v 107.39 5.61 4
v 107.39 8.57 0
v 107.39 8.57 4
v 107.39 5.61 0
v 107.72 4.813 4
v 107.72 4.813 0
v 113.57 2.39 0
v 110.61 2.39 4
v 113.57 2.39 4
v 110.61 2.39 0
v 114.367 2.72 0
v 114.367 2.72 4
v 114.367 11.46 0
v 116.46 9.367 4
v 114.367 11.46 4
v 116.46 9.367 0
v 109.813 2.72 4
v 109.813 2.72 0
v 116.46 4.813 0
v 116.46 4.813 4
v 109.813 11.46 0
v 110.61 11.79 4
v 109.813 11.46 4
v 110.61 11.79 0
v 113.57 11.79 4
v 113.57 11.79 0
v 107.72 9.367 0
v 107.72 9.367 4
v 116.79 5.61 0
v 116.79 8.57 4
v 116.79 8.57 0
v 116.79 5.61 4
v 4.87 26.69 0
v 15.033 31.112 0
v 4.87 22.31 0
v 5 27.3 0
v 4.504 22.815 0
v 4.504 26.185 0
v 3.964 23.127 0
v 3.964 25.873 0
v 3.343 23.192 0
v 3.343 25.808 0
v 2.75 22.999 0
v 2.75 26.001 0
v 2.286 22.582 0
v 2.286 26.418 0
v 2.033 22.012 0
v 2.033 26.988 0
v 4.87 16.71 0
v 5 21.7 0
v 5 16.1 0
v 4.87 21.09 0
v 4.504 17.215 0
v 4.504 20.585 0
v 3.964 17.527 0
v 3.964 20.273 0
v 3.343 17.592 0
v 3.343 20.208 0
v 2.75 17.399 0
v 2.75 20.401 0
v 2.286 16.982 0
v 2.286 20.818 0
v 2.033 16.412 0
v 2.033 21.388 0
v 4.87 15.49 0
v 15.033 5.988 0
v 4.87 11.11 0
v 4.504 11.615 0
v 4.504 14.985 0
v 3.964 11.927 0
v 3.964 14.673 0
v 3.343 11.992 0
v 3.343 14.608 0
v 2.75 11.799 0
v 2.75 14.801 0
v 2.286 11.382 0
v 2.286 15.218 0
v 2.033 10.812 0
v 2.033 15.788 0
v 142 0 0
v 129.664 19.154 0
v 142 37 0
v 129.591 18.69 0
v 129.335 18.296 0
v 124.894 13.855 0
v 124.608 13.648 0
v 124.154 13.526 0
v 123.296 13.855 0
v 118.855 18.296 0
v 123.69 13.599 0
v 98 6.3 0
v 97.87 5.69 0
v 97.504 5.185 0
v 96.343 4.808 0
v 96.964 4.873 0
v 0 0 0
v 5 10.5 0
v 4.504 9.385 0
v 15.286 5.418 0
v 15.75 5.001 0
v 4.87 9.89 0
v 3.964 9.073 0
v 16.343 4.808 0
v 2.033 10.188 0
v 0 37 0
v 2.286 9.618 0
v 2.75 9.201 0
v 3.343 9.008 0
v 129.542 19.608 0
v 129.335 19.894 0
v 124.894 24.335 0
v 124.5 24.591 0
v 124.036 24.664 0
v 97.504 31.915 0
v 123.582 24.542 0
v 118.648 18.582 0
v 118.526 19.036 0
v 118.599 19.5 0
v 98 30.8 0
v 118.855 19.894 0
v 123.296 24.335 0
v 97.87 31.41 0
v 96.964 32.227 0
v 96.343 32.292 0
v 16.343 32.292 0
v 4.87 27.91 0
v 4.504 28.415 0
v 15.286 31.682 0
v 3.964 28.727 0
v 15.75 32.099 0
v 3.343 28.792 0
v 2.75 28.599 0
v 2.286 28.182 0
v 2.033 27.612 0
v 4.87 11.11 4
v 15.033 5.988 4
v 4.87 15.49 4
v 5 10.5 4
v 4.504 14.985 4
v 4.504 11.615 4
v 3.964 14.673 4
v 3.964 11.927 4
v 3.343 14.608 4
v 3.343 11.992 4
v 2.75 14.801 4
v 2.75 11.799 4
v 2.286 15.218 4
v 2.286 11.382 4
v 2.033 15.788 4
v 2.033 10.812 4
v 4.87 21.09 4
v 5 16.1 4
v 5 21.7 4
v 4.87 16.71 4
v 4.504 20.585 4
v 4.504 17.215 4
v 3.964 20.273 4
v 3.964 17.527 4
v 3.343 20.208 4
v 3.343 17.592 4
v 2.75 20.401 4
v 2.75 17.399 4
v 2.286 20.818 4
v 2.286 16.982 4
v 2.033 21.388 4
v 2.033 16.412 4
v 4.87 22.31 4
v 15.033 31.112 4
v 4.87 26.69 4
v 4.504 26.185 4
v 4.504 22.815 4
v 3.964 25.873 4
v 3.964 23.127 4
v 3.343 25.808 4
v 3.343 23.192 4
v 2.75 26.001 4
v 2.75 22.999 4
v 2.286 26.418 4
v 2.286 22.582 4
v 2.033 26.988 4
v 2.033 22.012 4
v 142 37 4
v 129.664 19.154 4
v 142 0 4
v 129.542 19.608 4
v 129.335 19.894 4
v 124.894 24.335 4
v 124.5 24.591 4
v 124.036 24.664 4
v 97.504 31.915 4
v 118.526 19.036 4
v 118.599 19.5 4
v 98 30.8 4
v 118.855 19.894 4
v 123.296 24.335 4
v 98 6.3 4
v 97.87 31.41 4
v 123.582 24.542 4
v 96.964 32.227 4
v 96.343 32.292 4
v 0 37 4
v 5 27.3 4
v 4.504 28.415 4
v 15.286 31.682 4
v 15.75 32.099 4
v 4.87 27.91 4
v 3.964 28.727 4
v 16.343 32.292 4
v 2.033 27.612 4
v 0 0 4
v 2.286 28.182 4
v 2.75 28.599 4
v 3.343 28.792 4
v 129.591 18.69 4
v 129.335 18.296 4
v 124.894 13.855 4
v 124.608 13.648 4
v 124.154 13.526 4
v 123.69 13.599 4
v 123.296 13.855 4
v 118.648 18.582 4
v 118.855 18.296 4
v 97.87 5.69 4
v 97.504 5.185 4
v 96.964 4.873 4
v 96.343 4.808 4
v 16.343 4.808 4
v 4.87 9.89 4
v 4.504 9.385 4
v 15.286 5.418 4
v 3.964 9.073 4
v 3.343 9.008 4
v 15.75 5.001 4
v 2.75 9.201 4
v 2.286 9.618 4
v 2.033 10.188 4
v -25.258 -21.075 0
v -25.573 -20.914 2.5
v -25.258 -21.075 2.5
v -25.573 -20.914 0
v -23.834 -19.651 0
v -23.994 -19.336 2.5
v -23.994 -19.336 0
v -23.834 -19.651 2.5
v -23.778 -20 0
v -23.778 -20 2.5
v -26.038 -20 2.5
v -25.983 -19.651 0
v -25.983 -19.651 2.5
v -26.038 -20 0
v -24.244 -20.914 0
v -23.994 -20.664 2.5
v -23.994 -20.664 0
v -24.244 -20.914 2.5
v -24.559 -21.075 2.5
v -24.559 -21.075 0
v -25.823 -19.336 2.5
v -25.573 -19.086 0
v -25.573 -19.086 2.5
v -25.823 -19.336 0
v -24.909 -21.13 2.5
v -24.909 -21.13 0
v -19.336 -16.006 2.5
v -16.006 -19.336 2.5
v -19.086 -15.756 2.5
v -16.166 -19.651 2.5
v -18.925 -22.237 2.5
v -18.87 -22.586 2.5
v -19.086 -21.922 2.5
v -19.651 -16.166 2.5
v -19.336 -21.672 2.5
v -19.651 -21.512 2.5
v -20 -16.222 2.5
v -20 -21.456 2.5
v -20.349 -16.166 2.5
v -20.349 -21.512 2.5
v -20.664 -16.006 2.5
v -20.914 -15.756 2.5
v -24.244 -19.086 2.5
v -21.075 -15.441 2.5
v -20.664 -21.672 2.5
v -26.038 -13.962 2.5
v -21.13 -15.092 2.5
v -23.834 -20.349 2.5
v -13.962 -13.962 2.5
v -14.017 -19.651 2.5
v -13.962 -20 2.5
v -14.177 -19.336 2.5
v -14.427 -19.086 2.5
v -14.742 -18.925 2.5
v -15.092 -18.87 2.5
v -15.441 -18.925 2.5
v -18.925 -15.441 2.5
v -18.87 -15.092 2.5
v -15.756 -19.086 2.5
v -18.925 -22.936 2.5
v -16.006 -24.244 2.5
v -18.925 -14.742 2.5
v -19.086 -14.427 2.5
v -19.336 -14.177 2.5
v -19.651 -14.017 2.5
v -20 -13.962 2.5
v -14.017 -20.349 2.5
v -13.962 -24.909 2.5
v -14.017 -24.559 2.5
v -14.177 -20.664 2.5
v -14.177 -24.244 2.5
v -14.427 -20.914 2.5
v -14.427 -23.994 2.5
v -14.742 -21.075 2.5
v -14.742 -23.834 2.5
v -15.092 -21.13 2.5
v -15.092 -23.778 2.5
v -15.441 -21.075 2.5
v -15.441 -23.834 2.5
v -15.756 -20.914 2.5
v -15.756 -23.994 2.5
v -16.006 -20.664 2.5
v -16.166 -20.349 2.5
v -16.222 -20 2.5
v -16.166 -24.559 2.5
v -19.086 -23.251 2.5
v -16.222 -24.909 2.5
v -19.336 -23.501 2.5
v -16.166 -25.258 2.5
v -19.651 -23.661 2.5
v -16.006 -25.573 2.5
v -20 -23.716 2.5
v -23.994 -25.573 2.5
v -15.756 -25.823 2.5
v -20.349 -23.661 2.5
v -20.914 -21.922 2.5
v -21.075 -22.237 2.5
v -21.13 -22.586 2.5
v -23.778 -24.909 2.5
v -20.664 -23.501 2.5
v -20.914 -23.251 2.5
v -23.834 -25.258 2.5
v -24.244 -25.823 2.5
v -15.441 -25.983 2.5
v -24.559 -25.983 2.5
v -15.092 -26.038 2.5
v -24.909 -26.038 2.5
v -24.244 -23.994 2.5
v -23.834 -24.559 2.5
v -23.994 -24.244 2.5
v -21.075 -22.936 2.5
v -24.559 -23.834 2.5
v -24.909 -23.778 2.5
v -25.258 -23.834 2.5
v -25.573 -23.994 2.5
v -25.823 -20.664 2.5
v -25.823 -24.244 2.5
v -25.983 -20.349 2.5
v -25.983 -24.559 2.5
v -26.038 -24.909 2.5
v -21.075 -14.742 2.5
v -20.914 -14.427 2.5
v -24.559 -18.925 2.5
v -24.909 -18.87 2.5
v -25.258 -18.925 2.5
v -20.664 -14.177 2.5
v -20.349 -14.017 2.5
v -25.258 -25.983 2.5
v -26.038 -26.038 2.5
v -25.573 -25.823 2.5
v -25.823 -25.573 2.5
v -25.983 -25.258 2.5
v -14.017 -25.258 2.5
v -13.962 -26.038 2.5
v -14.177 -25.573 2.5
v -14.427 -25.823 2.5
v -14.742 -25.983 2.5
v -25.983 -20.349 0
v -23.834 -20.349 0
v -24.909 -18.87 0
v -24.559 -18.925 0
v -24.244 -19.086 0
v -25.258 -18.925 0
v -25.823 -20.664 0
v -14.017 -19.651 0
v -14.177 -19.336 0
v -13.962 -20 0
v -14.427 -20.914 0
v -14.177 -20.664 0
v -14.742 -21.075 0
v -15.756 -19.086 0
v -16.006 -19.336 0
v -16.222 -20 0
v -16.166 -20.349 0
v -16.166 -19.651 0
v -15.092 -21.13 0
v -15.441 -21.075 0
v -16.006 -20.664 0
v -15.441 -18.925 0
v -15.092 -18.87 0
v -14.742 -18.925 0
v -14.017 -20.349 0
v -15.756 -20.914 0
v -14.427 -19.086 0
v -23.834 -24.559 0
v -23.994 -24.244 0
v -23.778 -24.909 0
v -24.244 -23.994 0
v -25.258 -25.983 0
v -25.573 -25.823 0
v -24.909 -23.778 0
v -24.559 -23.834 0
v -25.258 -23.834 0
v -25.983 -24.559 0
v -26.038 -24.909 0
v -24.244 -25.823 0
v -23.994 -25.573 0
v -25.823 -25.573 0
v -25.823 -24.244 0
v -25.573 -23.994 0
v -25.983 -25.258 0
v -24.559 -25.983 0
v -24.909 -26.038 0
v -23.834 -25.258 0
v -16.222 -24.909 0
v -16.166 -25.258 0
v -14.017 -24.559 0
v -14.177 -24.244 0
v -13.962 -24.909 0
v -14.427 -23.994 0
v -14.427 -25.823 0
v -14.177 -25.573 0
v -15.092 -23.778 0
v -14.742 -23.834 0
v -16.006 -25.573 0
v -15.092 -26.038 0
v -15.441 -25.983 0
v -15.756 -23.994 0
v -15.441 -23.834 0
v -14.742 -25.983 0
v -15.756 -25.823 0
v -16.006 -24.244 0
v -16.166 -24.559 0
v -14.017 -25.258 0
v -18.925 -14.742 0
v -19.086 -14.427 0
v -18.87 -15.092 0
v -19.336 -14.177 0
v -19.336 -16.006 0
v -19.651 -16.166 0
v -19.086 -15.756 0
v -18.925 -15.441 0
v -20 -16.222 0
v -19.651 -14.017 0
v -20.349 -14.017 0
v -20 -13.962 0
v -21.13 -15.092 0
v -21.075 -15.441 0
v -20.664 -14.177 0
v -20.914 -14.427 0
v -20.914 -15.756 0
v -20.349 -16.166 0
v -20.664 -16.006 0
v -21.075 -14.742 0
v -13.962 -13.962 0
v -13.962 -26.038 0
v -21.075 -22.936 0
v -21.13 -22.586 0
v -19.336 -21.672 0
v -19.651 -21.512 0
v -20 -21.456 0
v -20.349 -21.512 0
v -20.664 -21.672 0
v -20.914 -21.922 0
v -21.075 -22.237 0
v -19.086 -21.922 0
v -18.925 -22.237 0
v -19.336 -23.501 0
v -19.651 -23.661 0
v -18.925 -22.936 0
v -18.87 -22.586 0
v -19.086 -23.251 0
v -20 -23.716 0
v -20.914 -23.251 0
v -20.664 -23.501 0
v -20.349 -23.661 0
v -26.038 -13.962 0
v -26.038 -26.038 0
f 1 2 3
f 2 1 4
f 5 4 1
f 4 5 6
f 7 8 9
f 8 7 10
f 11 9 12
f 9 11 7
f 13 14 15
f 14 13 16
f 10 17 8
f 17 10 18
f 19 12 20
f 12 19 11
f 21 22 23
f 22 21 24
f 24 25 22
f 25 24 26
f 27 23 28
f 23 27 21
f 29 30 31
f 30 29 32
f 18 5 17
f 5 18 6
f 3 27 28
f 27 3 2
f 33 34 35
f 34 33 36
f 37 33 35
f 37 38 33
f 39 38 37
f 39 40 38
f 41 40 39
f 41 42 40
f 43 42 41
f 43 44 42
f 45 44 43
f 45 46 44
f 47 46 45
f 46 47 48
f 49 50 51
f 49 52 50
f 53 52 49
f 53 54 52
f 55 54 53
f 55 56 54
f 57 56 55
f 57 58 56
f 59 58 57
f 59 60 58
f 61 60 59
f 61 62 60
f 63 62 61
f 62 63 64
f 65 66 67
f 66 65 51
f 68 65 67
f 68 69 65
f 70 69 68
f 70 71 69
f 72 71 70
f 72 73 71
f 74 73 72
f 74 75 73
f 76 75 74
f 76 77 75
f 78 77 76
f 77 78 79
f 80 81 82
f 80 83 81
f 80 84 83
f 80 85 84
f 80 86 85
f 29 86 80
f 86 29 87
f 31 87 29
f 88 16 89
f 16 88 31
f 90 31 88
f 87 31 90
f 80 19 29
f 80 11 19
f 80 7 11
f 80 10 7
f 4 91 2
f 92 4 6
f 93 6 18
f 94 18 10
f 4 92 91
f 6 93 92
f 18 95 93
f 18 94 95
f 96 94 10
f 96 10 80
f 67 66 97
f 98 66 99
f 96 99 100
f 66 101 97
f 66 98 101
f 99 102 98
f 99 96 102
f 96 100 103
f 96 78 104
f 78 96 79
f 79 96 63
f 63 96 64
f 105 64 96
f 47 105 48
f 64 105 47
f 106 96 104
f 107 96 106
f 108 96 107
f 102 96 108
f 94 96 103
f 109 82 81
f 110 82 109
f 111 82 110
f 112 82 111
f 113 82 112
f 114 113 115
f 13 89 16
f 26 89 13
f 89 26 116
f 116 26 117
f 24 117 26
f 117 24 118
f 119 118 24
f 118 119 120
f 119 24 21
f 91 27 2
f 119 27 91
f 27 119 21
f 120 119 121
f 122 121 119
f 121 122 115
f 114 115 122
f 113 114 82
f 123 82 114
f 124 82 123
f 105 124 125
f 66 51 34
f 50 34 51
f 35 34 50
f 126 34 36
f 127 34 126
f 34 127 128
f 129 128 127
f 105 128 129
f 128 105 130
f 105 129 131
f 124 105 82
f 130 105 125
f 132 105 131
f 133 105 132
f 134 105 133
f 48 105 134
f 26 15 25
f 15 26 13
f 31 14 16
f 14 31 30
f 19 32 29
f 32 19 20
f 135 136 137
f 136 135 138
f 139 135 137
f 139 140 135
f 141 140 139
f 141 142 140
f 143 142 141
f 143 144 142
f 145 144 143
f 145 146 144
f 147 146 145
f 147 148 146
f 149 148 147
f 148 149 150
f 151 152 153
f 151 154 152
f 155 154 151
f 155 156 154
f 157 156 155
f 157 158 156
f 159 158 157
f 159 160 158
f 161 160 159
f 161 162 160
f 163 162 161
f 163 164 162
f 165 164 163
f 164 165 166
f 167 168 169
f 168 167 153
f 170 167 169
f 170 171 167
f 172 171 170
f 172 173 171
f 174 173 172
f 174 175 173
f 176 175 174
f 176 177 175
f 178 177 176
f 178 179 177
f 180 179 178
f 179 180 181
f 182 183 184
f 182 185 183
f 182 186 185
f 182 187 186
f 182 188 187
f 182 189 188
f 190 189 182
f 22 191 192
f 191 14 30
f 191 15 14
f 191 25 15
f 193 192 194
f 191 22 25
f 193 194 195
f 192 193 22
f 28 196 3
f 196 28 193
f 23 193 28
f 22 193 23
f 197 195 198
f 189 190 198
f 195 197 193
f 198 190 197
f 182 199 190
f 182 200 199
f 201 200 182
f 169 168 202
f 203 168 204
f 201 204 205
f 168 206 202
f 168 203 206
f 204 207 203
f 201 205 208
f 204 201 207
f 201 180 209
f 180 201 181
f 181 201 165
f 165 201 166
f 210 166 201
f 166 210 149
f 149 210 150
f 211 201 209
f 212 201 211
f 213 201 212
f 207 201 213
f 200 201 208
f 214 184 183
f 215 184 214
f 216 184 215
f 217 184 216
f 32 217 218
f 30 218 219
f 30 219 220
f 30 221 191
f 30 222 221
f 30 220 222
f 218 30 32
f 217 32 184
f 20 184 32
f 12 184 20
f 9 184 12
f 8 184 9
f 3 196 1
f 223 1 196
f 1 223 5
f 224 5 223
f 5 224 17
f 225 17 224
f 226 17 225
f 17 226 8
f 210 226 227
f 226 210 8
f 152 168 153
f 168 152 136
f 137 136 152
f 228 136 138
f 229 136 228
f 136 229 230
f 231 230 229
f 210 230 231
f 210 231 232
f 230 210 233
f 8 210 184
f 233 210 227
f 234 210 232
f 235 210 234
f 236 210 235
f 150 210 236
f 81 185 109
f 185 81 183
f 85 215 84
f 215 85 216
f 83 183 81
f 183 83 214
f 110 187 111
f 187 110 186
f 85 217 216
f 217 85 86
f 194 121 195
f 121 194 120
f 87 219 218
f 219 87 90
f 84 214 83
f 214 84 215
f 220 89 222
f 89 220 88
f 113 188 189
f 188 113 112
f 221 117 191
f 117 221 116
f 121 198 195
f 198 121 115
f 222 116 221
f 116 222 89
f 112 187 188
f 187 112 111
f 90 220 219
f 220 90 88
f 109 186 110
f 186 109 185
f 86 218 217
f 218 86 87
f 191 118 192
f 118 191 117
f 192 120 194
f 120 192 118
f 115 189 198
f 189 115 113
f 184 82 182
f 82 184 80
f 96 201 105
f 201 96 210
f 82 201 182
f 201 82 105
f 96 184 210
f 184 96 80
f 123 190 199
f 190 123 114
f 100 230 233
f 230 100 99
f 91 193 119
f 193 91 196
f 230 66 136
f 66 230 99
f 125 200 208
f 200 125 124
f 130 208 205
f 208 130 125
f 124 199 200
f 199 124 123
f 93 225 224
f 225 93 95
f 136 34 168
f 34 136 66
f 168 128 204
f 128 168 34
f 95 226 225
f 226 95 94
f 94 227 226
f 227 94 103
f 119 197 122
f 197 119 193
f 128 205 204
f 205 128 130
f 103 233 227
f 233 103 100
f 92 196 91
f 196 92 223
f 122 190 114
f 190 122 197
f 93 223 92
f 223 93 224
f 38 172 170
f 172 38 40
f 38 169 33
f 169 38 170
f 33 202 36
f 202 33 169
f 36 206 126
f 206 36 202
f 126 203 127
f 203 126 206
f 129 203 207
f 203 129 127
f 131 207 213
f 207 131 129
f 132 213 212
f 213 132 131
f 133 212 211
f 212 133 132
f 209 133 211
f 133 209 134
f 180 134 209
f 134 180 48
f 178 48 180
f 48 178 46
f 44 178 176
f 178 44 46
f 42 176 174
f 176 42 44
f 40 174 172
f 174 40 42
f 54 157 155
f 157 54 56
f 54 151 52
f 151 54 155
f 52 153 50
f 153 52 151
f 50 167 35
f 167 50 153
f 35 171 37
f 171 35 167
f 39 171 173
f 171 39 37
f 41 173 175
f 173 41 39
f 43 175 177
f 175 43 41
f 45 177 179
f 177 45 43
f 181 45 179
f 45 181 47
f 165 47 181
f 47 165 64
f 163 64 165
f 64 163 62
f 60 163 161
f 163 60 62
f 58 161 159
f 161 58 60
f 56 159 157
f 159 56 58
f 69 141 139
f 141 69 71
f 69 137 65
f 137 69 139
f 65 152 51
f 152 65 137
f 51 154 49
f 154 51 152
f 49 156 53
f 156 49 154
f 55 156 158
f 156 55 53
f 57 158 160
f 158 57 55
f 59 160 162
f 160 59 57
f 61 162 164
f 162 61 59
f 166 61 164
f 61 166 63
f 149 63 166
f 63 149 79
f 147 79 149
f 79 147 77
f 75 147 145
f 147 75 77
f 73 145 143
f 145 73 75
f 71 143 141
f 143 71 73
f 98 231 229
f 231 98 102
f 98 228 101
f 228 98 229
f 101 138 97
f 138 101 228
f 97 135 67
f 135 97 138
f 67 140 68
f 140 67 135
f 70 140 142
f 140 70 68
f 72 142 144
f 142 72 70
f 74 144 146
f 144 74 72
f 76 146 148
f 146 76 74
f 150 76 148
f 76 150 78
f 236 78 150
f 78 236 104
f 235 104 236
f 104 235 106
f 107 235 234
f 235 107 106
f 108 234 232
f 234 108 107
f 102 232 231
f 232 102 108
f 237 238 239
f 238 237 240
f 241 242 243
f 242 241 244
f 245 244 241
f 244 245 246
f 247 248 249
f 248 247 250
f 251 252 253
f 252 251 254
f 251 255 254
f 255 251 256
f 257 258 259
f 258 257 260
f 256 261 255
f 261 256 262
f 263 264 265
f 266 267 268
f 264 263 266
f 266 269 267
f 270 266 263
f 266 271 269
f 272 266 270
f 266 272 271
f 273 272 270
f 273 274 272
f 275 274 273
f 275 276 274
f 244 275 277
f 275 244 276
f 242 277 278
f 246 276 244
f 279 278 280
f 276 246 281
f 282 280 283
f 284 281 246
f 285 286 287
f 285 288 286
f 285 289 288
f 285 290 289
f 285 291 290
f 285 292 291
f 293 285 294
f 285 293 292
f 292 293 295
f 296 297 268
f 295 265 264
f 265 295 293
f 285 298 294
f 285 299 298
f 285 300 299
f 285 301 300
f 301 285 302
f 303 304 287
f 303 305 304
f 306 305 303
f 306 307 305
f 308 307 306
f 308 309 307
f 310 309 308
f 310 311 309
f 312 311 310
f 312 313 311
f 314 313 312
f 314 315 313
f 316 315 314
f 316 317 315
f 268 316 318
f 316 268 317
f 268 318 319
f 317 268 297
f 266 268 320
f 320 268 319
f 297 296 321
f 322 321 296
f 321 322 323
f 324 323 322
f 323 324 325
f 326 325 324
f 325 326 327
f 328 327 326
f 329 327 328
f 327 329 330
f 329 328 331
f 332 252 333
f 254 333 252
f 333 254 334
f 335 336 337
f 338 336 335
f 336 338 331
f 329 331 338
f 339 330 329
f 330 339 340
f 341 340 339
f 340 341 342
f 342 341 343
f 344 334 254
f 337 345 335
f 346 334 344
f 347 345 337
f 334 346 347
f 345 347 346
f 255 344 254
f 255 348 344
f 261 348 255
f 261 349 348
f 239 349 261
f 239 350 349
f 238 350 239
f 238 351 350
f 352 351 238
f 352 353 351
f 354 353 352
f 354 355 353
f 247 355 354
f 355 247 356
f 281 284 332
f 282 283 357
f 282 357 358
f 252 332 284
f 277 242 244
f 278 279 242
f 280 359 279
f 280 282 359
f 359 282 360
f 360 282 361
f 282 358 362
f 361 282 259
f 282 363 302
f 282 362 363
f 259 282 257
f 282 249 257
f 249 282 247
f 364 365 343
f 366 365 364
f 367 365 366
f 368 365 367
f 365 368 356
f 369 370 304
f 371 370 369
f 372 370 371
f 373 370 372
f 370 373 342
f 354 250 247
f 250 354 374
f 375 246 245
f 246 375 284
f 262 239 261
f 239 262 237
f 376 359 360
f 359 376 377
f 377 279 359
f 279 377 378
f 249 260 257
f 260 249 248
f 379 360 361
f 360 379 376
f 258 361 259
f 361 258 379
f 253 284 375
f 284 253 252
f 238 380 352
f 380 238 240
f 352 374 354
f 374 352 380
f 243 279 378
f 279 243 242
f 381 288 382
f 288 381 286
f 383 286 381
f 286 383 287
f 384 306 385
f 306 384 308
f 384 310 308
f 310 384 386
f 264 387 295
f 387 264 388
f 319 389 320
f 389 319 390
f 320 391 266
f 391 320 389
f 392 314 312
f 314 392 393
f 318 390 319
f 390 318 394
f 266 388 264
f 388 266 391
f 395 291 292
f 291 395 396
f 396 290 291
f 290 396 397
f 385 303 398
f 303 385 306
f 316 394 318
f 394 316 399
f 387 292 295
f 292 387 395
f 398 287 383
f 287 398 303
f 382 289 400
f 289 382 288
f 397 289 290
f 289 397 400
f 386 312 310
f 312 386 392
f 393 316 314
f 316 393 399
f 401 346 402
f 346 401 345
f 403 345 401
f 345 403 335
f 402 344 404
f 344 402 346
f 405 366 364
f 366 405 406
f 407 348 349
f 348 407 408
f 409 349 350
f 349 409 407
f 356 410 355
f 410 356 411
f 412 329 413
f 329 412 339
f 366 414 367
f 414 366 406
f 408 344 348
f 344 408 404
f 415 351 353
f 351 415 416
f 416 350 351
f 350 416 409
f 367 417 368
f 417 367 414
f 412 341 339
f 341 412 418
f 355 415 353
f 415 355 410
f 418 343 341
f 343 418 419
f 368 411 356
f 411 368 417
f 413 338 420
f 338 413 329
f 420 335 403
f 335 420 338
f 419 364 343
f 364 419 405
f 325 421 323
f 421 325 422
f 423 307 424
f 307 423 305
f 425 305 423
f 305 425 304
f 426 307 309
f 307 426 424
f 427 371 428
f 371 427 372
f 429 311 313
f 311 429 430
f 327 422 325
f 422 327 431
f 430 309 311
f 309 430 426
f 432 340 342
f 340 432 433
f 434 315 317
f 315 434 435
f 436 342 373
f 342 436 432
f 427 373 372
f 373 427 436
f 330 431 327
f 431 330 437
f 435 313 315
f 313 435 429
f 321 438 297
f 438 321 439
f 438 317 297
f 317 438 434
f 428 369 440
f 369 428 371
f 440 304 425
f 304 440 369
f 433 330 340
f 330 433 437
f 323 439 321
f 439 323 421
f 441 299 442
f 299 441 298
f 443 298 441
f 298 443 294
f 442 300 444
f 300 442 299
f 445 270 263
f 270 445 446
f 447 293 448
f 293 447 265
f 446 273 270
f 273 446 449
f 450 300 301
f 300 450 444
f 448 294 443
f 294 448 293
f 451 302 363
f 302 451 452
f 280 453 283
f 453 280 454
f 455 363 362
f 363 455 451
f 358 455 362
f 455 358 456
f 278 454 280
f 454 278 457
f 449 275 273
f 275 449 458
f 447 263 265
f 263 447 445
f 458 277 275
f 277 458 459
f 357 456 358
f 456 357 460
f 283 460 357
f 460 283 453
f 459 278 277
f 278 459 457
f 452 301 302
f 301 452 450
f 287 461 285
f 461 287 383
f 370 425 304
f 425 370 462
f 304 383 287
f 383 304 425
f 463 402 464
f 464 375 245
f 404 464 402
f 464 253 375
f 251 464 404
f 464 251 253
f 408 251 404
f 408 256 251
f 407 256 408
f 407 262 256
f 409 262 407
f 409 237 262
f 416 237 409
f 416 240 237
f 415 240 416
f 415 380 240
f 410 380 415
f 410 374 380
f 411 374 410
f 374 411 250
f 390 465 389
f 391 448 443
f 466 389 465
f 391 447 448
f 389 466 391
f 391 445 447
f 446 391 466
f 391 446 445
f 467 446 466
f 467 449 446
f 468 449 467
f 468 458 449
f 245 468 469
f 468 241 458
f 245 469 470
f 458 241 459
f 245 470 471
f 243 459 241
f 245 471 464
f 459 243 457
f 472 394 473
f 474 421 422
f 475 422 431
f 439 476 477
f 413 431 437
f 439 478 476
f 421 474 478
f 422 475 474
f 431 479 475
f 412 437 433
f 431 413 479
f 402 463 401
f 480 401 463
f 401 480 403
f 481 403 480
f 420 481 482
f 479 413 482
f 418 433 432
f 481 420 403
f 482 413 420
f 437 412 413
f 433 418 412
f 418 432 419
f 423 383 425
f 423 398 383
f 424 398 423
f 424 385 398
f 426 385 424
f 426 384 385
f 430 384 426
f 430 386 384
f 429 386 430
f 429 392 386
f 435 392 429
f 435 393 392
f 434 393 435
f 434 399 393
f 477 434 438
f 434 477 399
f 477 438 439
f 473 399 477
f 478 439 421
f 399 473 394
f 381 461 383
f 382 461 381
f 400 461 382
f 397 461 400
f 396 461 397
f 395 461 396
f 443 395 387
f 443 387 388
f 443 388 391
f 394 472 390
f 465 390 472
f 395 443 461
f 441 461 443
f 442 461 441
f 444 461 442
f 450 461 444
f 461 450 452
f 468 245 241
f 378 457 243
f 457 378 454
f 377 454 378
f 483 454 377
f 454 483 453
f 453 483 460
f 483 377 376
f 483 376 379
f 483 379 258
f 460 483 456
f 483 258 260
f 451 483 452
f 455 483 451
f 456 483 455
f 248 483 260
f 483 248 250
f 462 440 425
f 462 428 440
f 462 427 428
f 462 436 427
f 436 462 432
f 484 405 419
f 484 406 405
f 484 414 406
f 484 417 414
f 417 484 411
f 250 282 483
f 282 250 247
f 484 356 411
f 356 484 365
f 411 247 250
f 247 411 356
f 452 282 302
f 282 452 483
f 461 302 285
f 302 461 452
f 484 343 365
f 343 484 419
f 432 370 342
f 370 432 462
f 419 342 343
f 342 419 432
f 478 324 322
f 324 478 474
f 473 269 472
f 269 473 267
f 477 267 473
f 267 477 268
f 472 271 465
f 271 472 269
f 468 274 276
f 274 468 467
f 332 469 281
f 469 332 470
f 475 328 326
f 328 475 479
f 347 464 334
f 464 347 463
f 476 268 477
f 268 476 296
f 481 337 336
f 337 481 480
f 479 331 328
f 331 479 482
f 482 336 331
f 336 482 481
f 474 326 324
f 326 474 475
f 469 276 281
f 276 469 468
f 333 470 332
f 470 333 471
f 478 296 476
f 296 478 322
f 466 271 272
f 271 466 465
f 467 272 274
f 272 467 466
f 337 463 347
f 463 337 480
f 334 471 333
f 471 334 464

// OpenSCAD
//import("C:\\Users\\anagle\\Downloads\\case.stl");

module rounded_rect(size, radius)
{
    x = size[0];
    y = size[1];
    z = size[2];
    $fn=15;

    linear_extrude(height=z)
    hull()
    {

        // place 4 circles in the corners, with the given radius
        translate([(-x/2)+radius, (-y/2)+radius, 0])
        circle(r=radius);

        translate([(x/2)-radius, (-y/2)+radius, 0])
        circle(r=radius);

        translate([(-x/2)+radius, (y/2)-radius, 0])
        circle(r=radius);

        translate([(x/2)-radius, (y/2)-radius, 0])
        circle(r=radius);

        
    }
}



difference() {
    cube([142,37,4]);

    translate([41.5 + 15, 13.75 + 4.8])

    rounded_rect([83,27.5,4], 1.5);
    
    led_radius = 1.5;
    
    linear_extrude(height=4) {
        translate([3.5, 10.5])
        circle(r=led_radius, $fn=15);
        translate([3.5, 16.1])
        circle(r=led_radius, $fn=15);
        translate([3.5, 21.7])
        circle(r=led_radius, $fn=15);
        translate([3.5, 27.3])
        circle(r=led_radius, $fn=15);
    }
    
    // Total width/height = 33.41
    // Need to verify the 3.5 measurement
    translate([142 - 33.41 + 3.5,37 - 33.41 + 3.5])
    union() {
        

        translate([0, 0, 2])
        hull(){
            cube([2.96, 9.4, 4], true);
            rotate([0,0,45])
            cube([2.96, 9.4, 4], true);
            rotate([0,0,90])
            cube([2.96, 9.4, 4], true);
            rotate([0,0,135])
            cube([2.96, 9.4, 4], true);
        }
        
        // Center button
        translate([12.005,12.005])
        rotate([0,0,45])
        linear_extrude(height=4) {
            $fn=15;
            offset(r=1.13)
            square([6.28, 6.28], true);
        }
        
    }
    
}

//(6.28+1.13+1.13)* sqrt(2)
btn_w = 12.077; //overall width/height of the area
btn_wh = btn_w / 2;
btn_c_r = 1.13; //radius of the rounded corners 
lwr_os = 7.495; // from the bottom up
translate([-20, -20, 0]){
    $fn=20;
    difference() {
        translate([-btn_w/2, -btn_w/2]){
            cube([btn_w, btn_w, 2.5]);
        }
        union() {
            translate([-btn_wh + btn_c_r, 0 , 0]) 
                cylinder(r=1.13, h=5, fn=20, center=true);
            translate([btn_wh - btn_c_r, 0, 0]) 
                cylinder(r=1.13, h=5, fn=20, center=true);
            translate([-btn_wh + btn_c_r, -btn_wh + btn_c_r , 0]) 
                cylinder(r=1.13, h=5, fn=20, center=true);
            translate([btn_wh - btn_c_r, -btn_wh + btn_c_r, 0]) 
                cylinder(r=1.13, h=5, fn=20, center=true);
            translate([0, btn_wh - btn_c_r, 0]) 
                cylinder(r=1.13, h=5, fn=20, center=true);

        }
        
        translate([0, btn_wh - lwr_os - btn_c_r, 0]) 
            cylinder(r=1.13, h=5, fn=20, center=true);
        
    }
}
